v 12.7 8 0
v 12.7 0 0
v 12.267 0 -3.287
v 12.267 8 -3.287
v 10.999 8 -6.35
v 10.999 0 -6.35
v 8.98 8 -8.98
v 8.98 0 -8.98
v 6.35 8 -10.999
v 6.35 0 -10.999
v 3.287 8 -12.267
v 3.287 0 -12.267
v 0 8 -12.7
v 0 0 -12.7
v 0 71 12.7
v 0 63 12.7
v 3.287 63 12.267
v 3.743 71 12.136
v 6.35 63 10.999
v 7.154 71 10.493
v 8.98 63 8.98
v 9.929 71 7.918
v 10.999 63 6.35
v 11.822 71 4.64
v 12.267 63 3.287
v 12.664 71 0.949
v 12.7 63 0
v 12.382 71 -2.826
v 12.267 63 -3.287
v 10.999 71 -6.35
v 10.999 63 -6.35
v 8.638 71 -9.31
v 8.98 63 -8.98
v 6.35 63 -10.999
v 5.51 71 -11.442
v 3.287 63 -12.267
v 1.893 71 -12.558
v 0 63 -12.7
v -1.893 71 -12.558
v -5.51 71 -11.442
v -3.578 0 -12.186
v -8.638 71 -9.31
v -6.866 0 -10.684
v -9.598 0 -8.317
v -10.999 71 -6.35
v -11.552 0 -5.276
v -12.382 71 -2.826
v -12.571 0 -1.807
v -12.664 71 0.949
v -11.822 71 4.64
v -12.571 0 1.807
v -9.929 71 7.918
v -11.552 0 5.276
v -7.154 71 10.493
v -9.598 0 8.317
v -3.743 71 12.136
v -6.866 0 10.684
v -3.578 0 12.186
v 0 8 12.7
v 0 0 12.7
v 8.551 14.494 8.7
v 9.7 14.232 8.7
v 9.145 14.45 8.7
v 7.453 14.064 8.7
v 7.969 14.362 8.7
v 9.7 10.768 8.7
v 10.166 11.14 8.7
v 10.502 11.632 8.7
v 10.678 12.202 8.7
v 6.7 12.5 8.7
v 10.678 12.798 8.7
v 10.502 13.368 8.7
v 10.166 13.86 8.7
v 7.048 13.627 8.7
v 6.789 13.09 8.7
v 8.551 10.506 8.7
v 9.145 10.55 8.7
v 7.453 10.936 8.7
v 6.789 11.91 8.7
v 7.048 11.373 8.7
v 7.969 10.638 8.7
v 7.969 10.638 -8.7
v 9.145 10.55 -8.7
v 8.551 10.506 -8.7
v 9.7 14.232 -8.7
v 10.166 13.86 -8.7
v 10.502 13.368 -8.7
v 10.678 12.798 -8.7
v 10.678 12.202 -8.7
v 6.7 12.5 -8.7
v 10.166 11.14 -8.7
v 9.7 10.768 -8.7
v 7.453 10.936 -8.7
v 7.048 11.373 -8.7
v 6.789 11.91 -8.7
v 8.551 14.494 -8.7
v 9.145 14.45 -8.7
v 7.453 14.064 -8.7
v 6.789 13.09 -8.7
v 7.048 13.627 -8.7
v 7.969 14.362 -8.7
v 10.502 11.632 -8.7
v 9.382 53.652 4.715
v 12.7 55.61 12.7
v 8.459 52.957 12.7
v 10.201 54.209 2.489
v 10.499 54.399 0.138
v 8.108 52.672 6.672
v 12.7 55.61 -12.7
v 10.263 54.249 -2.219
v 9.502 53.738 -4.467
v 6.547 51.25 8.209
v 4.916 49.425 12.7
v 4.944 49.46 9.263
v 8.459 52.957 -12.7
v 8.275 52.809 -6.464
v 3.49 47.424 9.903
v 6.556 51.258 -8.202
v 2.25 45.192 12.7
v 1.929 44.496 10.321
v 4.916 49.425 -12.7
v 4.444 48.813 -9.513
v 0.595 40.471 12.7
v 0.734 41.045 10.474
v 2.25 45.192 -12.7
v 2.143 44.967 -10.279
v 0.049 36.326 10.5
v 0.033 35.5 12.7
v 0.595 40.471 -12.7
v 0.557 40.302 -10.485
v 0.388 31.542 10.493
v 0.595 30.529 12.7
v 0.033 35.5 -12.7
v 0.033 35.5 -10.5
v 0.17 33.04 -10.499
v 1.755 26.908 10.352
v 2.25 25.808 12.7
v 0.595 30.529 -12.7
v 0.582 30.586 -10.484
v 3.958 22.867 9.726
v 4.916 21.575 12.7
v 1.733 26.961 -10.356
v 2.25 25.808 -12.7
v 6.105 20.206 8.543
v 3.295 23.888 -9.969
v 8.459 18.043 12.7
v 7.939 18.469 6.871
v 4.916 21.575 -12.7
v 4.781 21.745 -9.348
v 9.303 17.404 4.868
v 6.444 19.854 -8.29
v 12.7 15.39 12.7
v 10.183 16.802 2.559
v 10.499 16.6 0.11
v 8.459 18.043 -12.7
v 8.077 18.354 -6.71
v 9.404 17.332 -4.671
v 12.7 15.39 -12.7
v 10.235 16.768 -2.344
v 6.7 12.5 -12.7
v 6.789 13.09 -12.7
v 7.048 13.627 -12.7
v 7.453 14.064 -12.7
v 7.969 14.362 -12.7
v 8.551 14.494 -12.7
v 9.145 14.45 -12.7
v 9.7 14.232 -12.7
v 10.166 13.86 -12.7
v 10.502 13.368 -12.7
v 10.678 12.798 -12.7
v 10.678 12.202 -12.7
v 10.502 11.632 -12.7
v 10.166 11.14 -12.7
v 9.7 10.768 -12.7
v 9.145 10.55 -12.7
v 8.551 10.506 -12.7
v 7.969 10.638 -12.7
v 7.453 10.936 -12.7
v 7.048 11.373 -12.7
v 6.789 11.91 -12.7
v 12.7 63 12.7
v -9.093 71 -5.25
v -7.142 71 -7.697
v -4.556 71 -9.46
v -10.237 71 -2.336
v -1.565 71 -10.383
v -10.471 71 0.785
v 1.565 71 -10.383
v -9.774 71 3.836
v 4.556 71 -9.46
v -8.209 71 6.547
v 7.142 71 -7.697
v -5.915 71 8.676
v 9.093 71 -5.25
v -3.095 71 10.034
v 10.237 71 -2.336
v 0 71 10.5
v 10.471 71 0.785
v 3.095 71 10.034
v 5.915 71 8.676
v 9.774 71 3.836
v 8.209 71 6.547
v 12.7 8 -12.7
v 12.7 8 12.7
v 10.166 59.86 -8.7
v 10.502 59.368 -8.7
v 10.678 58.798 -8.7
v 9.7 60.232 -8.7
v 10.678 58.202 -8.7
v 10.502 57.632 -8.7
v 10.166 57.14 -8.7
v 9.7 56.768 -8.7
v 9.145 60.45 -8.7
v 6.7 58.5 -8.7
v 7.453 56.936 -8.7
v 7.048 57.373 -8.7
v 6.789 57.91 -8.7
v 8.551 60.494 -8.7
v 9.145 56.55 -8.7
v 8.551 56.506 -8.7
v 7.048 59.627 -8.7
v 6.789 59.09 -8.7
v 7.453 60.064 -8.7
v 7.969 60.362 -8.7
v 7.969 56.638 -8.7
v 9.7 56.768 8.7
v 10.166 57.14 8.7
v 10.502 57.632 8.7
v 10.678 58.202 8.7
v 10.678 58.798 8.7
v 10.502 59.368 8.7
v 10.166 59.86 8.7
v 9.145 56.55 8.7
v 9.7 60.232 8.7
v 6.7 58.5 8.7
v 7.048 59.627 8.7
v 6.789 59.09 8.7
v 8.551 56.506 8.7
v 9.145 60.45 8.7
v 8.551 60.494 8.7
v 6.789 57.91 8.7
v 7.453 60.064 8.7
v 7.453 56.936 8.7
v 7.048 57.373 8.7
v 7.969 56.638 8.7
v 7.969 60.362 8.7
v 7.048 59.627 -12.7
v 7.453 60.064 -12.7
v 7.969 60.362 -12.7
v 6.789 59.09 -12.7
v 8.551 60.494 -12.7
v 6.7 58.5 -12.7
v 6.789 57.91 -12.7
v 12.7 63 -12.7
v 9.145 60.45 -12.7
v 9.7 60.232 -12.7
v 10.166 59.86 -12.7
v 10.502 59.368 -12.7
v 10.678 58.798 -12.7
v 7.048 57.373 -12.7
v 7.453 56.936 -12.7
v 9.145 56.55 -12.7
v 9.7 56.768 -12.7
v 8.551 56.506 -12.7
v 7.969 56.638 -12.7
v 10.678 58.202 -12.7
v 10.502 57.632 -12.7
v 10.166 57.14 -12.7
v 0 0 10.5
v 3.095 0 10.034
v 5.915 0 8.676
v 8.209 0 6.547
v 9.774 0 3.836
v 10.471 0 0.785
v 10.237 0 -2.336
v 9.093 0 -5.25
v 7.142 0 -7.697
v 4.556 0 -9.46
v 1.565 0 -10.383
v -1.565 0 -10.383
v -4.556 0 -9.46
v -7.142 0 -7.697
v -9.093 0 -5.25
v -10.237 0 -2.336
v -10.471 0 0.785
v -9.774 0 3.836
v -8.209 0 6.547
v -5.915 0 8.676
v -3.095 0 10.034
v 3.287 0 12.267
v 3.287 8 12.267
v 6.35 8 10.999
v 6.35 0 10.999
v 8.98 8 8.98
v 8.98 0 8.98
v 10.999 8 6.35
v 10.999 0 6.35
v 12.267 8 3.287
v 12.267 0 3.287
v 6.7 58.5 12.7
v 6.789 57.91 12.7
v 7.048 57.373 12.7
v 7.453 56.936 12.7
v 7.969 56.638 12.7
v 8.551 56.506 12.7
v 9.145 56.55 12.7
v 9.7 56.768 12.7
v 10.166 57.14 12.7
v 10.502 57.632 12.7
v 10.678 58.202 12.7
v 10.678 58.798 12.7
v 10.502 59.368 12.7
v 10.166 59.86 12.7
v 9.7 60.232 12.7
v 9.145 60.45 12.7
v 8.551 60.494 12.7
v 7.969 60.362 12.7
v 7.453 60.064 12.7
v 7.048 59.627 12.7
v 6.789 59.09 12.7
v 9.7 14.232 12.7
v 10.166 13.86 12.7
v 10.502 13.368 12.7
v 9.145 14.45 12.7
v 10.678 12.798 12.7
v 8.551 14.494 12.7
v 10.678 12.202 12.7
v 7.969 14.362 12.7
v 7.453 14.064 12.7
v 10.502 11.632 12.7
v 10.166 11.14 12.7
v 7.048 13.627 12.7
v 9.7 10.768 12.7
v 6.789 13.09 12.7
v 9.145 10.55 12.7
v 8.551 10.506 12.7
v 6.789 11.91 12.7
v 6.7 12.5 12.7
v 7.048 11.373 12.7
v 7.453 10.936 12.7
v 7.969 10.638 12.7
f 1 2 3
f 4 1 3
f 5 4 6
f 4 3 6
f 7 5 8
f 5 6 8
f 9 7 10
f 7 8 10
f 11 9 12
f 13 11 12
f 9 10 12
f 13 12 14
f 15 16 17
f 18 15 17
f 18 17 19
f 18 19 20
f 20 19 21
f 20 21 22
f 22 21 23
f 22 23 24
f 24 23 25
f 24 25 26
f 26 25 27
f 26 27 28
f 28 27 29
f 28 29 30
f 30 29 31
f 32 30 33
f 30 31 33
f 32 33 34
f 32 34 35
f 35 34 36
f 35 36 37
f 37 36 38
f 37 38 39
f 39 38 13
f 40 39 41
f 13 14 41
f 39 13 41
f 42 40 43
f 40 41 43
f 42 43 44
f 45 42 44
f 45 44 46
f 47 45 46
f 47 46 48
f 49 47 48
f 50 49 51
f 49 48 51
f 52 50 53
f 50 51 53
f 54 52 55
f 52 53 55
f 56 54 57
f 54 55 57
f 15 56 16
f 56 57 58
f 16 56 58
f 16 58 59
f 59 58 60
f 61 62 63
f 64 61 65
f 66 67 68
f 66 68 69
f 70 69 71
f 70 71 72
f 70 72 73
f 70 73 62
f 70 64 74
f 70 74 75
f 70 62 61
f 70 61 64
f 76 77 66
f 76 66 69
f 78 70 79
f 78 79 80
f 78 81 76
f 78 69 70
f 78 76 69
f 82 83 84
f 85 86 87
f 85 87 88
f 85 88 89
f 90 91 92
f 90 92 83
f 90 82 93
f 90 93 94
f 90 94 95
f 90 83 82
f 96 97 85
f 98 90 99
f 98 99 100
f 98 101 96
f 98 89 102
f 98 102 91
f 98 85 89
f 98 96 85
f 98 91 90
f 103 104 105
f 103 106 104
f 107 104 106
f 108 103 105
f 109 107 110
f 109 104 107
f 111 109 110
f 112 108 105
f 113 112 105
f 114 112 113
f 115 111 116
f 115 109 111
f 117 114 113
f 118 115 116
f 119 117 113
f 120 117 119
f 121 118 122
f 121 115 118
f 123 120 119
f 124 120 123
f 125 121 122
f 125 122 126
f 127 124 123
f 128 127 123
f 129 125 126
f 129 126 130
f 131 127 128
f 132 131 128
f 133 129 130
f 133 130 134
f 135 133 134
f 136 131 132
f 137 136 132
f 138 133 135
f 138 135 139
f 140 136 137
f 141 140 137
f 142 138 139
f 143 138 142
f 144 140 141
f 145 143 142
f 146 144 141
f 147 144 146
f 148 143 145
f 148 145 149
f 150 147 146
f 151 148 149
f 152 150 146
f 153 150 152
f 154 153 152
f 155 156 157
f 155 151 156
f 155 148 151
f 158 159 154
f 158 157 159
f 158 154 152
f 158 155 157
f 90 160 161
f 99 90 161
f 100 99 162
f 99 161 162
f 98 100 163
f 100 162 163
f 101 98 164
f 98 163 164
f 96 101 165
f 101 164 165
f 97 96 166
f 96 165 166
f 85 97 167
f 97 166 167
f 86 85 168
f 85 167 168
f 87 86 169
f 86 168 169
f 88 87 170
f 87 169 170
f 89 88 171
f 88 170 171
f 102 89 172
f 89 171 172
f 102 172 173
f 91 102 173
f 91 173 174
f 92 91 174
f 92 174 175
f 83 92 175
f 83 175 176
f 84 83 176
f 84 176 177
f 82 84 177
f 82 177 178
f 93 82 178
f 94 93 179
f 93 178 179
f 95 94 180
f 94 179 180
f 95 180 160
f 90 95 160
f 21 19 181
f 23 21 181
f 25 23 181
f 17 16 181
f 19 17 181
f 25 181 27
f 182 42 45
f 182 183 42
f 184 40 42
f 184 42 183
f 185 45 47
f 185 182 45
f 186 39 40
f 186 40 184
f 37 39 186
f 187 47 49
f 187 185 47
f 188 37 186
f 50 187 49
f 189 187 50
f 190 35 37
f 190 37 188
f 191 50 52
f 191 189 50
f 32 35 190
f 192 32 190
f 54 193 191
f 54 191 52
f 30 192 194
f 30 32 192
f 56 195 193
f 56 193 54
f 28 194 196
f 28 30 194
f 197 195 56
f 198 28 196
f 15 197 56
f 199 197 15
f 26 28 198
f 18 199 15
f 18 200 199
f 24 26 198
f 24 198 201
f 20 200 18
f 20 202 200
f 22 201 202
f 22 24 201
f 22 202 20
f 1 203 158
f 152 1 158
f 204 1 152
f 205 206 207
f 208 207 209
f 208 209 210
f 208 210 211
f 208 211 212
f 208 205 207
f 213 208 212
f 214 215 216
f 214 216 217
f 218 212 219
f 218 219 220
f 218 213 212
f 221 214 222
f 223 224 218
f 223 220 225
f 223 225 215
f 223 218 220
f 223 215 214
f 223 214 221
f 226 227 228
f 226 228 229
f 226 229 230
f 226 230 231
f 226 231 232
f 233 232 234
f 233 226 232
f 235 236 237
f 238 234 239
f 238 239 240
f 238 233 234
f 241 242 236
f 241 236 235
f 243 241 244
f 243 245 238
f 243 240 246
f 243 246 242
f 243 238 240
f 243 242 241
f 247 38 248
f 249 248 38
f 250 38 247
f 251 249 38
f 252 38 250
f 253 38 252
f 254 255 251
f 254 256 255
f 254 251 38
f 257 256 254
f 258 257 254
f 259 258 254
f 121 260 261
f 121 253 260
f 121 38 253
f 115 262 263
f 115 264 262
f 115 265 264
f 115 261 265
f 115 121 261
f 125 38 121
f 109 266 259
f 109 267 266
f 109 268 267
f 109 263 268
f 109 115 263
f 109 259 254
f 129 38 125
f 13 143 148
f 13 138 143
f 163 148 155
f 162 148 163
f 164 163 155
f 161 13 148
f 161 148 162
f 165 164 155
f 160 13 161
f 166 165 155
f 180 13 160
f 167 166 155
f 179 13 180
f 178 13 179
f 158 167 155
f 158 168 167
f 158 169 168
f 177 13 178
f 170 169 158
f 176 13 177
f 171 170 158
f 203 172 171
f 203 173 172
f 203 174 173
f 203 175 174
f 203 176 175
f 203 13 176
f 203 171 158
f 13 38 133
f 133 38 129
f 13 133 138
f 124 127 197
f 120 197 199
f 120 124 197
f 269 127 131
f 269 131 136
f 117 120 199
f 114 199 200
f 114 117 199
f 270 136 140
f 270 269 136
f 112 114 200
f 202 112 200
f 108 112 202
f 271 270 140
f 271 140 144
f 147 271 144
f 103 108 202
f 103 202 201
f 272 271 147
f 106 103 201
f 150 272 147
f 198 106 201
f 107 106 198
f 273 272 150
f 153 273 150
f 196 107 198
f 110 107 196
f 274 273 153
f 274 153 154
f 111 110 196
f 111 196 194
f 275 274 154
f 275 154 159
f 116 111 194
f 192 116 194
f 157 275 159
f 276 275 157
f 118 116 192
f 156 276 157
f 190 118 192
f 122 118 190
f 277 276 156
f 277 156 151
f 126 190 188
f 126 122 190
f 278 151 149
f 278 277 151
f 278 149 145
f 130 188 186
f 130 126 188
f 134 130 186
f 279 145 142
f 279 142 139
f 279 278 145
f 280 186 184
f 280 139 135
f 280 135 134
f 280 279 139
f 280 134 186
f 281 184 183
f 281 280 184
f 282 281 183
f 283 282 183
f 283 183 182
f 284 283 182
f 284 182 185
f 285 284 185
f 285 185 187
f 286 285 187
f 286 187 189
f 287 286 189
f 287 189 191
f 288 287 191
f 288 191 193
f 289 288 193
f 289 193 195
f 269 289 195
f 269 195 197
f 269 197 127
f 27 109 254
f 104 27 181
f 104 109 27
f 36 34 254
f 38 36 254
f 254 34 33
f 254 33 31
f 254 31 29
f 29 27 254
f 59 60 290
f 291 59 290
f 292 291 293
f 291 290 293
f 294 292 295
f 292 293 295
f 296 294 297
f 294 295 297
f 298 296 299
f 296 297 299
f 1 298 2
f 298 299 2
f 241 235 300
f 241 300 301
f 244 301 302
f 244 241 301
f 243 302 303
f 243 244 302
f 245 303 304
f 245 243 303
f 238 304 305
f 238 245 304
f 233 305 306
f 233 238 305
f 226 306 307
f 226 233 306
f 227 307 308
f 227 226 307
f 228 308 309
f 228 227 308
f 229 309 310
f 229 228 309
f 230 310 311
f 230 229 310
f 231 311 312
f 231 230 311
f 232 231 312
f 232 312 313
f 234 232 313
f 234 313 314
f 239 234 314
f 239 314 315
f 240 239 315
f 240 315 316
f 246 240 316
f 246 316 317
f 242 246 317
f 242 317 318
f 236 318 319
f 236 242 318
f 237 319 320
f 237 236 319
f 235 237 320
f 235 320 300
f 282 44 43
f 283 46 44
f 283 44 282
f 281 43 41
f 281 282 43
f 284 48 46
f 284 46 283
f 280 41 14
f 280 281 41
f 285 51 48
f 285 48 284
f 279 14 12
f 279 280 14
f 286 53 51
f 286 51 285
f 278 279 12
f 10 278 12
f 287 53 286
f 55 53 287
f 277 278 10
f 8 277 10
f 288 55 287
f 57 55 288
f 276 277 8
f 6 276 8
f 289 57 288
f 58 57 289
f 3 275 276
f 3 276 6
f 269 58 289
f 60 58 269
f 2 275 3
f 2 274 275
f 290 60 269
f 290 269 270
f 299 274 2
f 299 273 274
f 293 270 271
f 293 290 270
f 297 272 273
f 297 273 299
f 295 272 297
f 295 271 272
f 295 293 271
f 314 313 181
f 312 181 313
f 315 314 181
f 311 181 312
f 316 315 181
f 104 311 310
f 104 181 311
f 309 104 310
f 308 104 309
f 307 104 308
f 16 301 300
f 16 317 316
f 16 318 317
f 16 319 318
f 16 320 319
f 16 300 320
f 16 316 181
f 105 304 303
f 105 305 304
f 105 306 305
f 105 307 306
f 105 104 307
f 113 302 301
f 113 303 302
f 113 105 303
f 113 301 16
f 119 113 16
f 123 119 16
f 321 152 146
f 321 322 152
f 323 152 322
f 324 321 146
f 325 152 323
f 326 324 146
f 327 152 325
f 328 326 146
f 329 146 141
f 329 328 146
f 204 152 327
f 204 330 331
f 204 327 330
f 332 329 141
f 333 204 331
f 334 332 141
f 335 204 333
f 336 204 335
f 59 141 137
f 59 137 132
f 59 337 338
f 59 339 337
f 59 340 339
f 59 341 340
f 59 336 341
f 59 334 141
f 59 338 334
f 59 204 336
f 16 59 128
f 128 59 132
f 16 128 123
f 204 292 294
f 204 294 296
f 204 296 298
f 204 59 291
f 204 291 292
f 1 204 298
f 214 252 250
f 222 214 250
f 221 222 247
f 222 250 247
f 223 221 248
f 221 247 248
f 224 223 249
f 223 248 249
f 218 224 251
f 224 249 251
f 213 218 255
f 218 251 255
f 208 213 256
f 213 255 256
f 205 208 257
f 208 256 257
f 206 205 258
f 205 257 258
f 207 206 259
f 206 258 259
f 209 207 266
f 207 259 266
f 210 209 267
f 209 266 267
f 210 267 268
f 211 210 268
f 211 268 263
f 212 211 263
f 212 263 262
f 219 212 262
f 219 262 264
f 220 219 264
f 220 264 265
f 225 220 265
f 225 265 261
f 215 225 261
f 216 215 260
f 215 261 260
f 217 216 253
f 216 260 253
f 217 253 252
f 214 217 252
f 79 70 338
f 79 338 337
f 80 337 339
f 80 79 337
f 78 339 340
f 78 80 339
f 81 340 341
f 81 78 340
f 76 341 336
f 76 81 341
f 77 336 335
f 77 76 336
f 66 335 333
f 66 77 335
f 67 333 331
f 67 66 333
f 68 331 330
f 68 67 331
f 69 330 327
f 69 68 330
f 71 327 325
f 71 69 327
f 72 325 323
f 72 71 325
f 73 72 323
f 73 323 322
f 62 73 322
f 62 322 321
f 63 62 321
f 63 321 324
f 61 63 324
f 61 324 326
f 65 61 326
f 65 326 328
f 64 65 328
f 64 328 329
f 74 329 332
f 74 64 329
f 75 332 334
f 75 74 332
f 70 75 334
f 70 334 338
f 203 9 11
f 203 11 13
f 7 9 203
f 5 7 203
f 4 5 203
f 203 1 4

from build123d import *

# Parameters (mm, degrees)
SKETCH1_R               = 12.7
SKETCH1_R_2             = 10.5
BOSS_EXTRUDE1_DEPTH     = 71
BOSS_EXTRUDE2_DEPTH     = 63
CUT_EXTRUDE1_DEPTH      = 8
CUT_EXTRUDE2_DEPTH      = 15
CUT_EXTRUDE2_DEPTH_BACK = 16
SKETCH4_R               = 22.297733005
SKETCH5_R               = 2
CUT_EXTRUDE3_DEPTH      = 4
CUT_EXTRUDE4_START      = -4
SKETCH6_R               = 2
CUT_EXTRUDE4_DEPTH      = 4


with BuildPart() as part:
    # Sketch1 → Boss-Extrude1 (new body)
    with BuildSketch(Plane(origin=(0, 0, 0), x_dir=(1, 0, 0), z_dir=(0, 1, 0))):
        with Locations(Location((0, 0, 0), (0, 0, 270))):
            Circle(SKETCH1_R)
        with Locations(Location((0, 0, 0), (0, 0, 270))):
            Circle(SKETCH1_R_2, mode=Mode.SUBTRACT)
    extrude(amount=BOSS_EXTRUDE1_DEPTH)

    # Sketch2 → Boss-Extrude2 (add)
    with BuildSketch(Plane.XZ):
        with BuildLine():
            Line((12.7, 12.7), (0, 12.7))
            ThreePointArc((0, 12.7), (8.980256121, 8.980256121), (12.7, 0))
            Line((12.7, 0), (12.7, 12.7))
        make_face()
        with BuildLine():
            Line((12.7, -12.7), (12.7, 0))
            ThreePointArc((12.7, 0), (8.980256121, -8.980256121), (0, -12.7))
            Line((0, -12.7), (12.7, -12.7))
        make_face()
    extrude(amount=-BOSS_EXTRUDE2_DEPTH)

    # Sketch3 → Cut-Extrude1 (cut)
    with BuildSketch(Plane.XZ):
        with BuildLine():
            Line((12.7, 12.7), (0, 12.7))
            ThreePointArc((0, 12.7), (8.980256109, 8.980256133), (12.7, 3.4e-08))
            Line((12.7, 3.4e-08), (12.7, 12.7))
        make_face()
        with BuildLine():
            Line((12.7, -12.7), (12.7, 3.4e-08))
            ThreePointArc((12.7, 3.4e-08), (8.980256133, -8.980256109), (0, -12.7))
            Line((0, -12.7), (12.7, -12.7))
        make_face()
    extrude(amount=-CUT_EXTRUDE1_DEPTH, mode=Mode.SUBTRACT)

    # Sketch4 → Cut-Extrude2 (cut, two sides: drawn at the far end of the back side and taken through both)
    with BuildSketch(Plane.XY.offset(-CUT_EXTRUDE2_DEPTH_BACK)):
        with Locations((22.331187996, 35.5)):
            Circle(SKETCH4_R)
    extrude(amount=CUT_EXTRUDE2_DEPTH + CUT_EXTRUDE2_DEPTH_BACK, mode=Mode.SUBTRACT)

    # Sketch5 → Cut-Extrude3 (cut)
    with BuildSketch(Plane(origin=(0, 0, -12.7), x_dir=(-1, 0, 0), z_dir=(0, 0, -1))):
        with Locations((-8.7, 58.5)):
            Circle(SKETCH5_R)
        with Locations((-8.7, 12.5)):
            Circle(SKETCH5_R)
    extrude(amount=-CUT_EXTRUDE3_DEPTH, mode=Mode.SUBTRACT)

    # Sketch6 → Cut-Extrude4 (cut)
    with BuildSketch(Plane.XY.offset(12.7).offset(CUT_EXTRUDE4_START)):
        with Locations(Location((8.7, 58.5, 0), (0, 0, 180))):
            Circle(SKETCH6_R)
        with Locations(Location((8.7, 12.5, 0), (0, 0, 180))):
            Circle(SKETCH6_R)
    extrude(amount=CUT_EXTRUDE4_DEPTH, mode=Mode.SUBTRACT)


solid = part.part
